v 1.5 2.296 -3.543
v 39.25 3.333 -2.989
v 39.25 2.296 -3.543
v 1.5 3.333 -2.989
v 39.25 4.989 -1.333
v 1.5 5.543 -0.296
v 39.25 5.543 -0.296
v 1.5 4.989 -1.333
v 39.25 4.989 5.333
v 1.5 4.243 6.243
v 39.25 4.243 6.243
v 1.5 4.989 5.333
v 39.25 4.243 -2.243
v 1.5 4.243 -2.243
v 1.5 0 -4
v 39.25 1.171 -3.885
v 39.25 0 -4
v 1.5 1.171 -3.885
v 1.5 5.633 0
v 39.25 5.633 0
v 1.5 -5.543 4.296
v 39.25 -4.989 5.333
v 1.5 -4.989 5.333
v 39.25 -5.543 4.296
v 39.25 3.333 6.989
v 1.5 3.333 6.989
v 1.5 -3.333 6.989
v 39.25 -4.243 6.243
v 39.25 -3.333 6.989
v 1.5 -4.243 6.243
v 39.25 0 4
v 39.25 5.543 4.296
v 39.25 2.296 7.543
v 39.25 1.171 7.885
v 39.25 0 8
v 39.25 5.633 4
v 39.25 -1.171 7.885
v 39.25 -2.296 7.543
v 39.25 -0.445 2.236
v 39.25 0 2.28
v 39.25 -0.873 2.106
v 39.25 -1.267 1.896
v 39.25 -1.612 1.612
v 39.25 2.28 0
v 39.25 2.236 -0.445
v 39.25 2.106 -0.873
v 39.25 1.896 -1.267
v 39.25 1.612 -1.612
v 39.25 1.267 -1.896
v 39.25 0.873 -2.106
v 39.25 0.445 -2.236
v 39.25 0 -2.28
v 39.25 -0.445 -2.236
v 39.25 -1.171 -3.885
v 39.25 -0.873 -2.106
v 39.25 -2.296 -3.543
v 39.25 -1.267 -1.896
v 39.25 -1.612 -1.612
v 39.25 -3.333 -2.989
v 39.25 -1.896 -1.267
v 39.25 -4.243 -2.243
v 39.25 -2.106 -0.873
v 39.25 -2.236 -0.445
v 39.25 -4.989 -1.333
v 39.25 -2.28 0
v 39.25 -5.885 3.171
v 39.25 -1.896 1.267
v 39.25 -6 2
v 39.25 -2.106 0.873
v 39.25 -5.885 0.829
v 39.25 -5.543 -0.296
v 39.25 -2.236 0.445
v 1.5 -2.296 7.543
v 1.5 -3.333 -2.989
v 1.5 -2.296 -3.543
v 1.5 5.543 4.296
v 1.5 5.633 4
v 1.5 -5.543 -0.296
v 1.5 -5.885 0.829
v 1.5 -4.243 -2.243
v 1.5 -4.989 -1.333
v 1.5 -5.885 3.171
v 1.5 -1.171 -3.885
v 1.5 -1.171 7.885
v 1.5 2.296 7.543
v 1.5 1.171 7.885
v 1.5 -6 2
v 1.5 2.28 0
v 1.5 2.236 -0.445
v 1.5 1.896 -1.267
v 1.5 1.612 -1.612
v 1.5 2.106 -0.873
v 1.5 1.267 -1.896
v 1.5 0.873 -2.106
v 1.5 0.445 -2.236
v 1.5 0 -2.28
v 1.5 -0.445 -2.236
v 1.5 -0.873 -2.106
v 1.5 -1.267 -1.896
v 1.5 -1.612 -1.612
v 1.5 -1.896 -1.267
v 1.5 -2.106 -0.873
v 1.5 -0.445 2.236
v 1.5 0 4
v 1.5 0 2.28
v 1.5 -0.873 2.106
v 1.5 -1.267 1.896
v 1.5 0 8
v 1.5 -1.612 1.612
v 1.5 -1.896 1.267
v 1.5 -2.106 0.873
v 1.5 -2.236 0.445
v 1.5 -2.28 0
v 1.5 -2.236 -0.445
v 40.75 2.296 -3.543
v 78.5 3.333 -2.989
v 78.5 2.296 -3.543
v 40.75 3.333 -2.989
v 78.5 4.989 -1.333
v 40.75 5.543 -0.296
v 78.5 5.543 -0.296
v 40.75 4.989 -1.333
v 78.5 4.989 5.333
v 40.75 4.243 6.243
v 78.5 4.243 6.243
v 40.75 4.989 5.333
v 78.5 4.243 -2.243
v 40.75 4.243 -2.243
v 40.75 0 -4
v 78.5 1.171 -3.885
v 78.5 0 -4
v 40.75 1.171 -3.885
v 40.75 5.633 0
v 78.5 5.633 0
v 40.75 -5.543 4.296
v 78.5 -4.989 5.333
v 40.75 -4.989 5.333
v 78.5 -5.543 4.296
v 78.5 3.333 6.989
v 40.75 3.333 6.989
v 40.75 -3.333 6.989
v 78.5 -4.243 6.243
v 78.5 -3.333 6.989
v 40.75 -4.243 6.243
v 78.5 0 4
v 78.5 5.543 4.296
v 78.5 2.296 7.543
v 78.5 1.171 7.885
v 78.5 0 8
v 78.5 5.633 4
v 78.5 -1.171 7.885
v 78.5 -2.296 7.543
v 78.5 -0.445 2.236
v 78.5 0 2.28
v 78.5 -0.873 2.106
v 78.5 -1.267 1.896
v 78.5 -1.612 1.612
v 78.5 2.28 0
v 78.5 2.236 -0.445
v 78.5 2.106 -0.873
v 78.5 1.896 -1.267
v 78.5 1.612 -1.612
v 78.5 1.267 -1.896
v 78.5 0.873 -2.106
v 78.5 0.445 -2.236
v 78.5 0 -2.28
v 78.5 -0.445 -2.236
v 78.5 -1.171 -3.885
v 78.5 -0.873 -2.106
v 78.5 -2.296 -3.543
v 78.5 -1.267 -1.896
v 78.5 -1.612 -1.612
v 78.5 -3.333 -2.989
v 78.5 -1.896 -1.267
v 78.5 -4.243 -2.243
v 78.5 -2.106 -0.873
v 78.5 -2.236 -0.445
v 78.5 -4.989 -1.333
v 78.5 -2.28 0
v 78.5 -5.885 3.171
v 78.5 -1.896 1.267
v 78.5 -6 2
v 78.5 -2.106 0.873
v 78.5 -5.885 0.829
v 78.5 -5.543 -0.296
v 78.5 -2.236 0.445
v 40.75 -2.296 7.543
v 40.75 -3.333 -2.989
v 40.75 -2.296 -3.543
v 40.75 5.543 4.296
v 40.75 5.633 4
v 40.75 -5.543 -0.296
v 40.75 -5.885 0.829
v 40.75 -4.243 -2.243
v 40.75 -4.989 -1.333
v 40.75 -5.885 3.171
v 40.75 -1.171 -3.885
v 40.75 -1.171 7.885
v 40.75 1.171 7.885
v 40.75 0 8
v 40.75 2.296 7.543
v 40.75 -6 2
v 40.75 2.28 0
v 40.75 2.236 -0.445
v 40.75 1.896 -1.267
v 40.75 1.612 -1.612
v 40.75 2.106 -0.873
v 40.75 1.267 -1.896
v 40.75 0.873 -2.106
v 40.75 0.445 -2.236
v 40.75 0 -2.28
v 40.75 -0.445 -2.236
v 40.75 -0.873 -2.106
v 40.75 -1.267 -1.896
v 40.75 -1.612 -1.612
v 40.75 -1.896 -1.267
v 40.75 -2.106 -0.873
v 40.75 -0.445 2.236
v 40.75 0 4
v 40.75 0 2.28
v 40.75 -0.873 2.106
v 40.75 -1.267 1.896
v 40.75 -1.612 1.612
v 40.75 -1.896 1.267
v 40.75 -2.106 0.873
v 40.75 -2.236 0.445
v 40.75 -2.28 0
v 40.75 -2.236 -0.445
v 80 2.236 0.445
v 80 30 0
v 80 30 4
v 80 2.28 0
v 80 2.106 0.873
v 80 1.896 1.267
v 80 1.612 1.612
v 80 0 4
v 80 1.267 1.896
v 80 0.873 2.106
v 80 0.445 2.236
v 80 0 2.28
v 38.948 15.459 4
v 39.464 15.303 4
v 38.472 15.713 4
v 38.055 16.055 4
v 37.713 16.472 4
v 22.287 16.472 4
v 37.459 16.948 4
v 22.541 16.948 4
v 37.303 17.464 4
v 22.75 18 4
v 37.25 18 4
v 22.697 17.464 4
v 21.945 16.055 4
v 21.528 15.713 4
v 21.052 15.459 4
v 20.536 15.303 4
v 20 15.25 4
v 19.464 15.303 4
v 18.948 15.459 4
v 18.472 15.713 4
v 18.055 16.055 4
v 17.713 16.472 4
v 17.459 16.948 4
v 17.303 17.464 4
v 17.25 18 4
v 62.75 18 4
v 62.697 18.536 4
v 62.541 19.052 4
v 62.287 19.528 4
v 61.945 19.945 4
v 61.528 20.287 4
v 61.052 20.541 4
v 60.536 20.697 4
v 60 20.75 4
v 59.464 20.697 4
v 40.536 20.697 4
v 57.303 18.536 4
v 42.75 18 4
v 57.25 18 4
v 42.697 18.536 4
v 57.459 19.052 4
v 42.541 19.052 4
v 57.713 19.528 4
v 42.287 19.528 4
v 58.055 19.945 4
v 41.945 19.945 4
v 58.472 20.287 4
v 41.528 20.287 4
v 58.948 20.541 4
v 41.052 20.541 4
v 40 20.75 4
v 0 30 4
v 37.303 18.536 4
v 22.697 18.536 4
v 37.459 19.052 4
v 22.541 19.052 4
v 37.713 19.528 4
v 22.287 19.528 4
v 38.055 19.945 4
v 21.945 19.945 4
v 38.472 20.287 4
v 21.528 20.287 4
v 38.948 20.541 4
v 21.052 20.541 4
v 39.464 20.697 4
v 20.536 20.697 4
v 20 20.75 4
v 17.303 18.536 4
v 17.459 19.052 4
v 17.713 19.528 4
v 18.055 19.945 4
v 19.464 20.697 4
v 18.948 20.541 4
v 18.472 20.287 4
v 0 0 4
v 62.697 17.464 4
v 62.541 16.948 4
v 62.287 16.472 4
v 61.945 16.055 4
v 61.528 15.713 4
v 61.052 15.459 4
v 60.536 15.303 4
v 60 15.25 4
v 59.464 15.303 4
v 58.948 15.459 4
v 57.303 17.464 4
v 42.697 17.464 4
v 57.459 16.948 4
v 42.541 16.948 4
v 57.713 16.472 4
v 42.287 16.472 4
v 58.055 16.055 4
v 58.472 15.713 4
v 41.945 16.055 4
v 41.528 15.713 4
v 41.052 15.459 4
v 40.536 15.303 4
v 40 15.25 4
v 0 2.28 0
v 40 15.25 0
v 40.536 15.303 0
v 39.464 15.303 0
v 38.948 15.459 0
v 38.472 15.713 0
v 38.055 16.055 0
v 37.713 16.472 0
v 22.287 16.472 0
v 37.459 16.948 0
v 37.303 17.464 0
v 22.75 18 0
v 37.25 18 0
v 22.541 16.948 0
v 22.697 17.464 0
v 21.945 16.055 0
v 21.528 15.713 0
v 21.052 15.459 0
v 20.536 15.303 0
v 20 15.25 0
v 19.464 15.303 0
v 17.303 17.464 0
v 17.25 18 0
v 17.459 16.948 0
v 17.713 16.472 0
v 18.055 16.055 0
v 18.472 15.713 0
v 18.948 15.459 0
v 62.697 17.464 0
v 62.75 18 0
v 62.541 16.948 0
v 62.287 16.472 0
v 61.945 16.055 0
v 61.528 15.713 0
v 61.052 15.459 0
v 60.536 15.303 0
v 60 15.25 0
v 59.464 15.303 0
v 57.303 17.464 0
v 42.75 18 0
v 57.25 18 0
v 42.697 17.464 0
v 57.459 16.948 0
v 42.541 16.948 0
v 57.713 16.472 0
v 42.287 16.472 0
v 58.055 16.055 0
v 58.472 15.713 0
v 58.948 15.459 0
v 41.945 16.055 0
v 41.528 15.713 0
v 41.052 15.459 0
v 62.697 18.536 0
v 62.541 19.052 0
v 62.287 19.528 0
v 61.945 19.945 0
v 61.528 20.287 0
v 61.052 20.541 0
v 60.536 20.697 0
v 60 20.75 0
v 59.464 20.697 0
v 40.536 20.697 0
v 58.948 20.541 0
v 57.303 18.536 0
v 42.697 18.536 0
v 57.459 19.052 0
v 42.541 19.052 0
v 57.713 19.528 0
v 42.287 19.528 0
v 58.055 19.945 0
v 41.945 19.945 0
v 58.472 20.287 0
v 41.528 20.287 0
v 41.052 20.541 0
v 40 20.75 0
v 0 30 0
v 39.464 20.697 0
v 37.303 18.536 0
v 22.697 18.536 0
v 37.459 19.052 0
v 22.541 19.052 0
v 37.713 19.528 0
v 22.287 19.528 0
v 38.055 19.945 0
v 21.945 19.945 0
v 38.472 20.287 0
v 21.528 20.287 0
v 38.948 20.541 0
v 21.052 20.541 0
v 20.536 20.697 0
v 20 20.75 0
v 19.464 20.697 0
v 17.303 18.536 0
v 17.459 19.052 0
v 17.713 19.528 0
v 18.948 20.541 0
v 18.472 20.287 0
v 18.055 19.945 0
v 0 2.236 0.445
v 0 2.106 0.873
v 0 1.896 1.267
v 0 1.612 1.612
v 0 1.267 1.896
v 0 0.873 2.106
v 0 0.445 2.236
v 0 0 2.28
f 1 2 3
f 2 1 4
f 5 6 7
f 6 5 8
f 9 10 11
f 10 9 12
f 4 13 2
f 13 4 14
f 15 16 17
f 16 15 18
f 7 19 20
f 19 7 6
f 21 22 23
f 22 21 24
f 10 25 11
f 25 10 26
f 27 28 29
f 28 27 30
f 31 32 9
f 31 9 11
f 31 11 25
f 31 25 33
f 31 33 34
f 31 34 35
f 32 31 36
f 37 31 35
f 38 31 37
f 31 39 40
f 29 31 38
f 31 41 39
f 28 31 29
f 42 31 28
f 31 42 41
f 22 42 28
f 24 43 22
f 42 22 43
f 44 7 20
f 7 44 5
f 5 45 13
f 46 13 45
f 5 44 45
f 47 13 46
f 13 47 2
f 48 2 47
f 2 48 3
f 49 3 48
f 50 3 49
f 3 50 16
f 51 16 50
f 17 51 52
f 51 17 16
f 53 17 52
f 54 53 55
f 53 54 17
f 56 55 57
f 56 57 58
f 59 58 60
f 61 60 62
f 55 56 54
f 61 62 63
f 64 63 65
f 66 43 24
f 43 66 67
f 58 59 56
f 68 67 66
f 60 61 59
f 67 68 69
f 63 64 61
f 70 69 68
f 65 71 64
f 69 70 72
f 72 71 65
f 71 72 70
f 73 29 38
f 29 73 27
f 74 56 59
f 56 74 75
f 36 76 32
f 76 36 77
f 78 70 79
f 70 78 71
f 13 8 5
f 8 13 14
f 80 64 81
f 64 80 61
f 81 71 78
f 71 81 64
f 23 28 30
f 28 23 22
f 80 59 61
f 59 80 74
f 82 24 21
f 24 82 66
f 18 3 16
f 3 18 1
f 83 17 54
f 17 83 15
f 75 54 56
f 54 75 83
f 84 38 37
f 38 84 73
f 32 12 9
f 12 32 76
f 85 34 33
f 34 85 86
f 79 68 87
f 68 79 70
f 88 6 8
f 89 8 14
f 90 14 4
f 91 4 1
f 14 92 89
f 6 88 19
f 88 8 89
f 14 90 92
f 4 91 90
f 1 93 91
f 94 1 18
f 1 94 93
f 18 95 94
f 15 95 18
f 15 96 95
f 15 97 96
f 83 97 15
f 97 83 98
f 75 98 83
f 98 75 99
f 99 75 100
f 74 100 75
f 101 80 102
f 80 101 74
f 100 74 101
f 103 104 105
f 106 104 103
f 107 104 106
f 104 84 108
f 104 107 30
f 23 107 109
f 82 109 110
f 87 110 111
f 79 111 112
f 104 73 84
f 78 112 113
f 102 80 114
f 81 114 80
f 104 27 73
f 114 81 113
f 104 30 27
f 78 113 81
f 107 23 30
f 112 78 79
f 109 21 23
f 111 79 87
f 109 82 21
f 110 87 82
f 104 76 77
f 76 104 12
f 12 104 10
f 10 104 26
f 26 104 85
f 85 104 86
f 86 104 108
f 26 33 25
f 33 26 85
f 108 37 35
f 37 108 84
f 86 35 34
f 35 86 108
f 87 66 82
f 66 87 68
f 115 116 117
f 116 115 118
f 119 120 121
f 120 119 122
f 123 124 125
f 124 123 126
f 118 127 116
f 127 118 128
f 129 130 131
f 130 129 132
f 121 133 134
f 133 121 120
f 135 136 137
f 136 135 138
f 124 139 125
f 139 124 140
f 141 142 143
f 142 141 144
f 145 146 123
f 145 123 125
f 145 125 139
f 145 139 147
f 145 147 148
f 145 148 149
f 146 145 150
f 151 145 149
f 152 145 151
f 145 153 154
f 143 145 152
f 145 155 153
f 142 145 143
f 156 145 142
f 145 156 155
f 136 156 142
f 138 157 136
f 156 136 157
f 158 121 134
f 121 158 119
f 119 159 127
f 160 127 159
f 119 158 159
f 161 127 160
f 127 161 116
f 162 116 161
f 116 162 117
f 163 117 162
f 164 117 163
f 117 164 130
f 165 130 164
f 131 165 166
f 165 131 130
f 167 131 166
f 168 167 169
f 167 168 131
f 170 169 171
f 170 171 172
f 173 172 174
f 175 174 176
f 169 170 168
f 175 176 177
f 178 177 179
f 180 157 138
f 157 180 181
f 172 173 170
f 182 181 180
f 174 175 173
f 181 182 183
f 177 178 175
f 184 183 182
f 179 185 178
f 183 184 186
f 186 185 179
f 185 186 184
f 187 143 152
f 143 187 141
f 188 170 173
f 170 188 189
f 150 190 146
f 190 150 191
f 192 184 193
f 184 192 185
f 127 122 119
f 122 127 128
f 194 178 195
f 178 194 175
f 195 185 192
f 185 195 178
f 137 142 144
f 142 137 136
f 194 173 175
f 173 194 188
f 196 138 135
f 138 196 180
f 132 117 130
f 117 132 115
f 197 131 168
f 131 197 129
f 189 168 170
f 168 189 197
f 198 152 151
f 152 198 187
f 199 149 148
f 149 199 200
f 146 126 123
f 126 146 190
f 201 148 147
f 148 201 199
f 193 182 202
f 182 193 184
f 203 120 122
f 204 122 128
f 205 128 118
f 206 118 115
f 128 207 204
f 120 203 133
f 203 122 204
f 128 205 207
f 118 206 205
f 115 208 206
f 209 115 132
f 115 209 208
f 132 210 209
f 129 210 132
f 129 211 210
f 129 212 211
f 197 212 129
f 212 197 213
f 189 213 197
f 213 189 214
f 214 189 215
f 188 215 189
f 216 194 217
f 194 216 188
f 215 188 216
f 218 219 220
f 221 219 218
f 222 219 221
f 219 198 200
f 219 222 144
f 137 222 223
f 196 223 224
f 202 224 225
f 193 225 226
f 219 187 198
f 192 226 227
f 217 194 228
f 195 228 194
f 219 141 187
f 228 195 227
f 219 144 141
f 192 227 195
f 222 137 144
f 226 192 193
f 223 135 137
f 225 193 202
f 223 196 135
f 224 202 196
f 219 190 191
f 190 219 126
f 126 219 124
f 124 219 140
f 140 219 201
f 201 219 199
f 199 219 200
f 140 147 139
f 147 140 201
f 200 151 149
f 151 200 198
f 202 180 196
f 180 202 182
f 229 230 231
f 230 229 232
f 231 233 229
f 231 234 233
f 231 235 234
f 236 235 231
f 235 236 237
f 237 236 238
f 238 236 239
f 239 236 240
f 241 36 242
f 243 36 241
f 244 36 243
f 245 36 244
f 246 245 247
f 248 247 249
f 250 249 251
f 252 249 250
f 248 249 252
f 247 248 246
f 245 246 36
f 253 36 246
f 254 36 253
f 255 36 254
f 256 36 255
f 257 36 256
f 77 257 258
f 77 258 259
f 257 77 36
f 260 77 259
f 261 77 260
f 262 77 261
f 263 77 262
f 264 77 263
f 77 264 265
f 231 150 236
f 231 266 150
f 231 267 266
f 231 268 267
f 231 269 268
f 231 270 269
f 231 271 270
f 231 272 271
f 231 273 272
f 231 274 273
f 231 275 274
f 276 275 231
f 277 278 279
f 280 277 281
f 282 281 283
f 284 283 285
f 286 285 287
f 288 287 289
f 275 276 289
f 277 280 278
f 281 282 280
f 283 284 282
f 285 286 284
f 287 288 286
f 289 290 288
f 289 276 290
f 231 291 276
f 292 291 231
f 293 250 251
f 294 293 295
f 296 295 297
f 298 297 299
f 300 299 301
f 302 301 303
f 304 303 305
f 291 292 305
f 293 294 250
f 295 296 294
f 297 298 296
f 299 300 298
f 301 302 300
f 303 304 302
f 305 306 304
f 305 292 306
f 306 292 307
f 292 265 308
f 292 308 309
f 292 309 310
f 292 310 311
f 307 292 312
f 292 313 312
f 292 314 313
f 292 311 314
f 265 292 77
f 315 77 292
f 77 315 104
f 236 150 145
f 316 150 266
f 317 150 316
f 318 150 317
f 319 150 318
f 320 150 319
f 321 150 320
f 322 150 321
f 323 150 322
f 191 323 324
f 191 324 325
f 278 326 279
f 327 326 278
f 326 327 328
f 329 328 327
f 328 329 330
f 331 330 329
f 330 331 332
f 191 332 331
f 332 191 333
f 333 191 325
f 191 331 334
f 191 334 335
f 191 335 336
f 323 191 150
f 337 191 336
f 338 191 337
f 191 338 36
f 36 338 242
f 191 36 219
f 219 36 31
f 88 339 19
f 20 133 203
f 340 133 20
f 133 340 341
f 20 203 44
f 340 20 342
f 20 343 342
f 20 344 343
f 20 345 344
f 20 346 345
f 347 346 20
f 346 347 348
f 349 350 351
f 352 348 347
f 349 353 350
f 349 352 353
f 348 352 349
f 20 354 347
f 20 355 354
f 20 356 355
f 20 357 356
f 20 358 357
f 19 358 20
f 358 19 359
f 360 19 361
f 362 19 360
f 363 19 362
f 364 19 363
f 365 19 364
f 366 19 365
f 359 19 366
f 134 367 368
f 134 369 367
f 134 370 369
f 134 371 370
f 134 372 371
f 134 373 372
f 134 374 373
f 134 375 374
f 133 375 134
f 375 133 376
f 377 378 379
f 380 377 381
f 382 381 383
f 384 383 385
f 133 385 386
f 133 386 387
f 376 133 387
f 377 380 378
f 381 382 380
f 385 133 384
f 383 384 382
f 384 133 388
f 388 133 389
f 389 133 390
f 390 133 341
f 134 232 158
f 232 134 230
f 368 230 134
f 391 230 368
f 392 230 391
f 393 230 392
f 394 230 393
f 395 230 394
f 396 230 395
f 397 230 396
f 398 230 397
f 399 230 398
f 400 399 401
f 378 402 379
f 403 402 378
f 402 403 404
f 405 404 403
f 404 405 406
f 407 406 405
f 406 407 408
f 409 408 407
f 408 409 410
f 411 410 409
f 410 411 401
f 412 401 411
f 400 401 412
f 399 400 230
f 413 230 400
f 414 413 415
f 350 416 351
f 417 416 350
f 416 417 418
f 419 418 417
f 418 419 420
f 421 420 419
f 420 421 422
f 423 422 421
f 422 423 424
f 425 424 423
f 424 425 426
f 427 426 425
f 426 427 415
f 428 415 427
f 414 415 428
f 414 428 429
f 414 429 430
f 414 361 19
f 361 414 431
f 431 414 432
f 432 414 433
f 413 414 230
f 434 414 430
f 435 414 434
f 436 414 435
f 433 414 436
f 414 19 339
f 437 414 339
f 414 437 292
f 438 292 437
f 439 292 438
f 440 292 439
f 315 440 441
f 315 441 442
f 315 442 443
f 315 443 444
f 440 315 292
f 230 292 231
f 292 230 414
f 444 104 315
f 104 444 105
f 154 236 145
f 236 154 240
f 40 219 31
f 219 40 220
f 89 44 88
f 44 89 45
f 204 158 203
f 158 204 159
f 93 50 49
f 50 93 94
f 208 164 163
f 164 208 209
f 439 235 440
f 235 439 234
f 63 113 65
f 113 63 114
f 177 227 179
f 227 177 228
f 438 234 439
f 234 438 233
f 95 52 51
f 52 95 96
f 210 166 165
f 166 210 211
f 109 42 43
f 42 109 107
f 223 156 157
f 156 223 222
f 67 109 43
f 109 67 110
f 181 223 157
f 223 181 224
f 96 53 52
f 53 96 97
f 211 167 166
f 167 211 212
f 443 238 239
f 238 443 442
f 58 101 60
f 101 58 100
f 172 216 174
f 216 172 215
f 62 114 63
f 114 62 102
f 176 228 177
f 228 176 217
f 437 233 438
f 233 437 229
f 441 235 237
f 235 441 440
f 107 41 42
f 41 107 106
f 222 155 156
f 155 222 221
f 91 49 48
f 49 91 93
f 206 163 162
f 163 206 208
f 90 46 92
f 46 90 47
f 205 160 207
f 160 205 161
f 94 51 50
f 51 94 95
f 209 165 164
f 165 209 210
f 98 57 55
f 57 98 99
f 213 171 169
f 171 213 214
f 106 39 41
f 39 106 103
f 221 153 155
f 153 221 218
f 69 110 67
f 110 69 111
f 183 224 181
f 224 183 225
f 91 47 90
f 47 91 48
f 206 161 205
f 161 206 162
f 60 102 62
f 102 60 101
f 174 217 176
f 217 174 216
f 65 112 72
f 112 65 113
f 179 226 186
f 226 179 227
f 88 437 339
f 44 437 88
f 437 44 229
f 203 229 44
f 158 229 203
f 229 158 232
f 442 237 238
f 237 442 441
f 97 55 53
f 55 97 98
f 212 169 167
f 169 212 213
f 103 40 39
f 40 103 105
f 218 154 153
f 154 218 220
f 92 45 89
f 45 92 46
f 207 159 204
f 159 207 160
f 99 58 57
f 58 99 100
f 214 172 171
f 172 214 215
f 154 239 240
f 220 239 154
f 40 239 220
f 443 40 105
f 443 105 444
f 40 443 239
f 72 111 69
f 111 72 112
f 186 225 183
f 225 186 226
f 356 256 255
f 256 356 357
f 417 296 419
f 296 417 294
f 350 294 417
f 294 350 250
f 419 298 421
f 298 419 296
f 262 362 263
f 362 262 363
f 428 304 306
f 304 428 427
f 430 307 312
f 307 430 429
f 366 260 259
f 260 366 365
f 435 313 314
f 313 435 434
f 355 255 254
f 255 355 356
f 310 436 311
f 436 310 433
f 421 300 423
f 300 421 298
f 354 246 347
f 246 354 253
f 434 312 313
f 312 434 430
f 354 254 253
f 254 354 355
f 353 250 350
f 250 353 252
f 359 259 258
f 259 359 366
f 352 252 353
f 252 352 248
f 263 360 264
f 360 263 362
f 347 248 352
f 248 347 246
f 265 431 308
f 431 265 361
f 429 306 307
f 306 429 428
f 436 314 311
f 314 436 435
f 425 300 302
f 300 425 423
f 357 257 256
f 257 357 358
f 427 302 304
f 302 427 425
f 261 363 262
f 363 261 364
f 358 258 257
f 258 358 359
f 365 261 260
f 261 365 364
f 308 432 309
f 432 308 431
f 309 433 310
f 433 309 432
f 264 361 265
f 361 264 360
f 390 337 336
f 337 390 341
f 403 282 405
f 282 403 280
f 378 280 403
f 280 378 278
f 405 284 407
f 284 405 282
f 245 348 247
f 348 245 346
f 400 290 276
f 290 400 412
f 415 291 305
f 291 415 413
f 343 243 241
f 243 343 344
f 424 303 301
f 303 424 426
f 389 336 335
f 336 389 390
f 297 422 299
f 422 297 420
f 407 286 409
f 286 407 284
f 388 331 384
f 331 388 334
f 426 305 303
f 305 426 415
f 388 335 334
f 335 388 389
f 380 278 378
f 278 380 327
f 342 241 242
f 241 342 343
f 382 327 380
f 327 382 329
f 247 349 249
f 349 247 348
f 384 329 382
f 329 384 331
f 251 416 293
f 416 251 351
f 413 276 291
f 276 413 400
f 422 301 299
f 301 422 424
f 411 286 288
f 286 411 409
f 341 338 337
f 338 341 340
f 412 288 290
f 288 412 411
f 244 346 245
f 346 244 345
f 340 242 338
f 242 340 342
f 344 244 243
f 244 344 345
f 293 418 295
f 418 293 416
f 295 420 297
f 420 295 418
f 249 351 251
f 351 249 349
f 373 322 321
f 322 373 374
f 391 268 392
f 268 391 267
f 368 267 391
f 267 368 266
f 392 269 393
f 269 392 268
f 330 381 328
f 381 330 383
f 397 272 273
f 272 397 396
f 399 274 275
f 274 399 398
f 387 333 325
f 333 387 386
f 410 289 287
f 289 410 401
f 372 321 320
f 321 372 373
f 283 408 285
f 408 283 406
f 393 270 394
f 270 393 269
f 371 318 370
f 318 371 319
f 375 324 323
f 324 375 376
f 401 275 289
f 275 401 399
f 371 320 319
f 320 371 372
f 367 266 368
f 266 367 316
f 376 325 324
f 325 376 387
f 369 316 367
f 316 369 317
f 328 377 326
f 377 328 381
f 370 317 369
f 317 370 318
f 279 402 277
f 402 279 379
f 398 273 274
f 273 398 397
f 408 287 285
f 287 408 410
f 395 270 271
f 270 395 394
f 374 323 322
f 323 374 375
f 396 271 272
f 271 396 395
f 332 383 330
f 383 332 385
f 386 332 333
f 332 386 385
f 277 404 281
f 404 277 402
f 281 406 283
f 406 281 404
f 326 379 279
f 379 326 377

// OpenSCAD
$fn = 32;

// ----------------------------------------------------------------------
// Hinge leaf: 80 x 36 x 12 mm
// ----------------------------------------------------------------------

// --- parameters (mm) ---
tab_len = 80;             // leaf length, X
tab_w = 30;               // leaf width, Y
tab_t = 4;                // leaf thickness
ring_d = 12;              // knuckle diameter
ring_w = 37.75;           // knuckle width
knuckle_n = 2;            // number of knuckles
pin_d = 4.56;             // pin bore
gap = 1.5;                // gap between the knuckles
screw_d = 5.5;            // screw clearance

module leaf() {
  cube([tab_len, tab_w, tab_t]);
}

module knuckles() {
  /* barrels sit on the leaf edge, the pin axis at half the leaf thickness */
  for (i = [0 : knuckle_n - 1])
    translate([gap + i * (ring_w + gap), 0, tab_t * 0.5])
      rotate([0, 90, 0]) cylinder(h = ring_w, d = ring_d);
}

difference() {
  union() {
    leaf();
    knuckles();
  }
  rotate([0, 90, 0]) translate([0, 0, -1])
    cylinder(h = tab_len + 2, d = pin_d);
  translate([20, tab_w * 0.6, -1]) cylinder(h = tab_t + 2, d = screw_d);
  translate([40, tab_w * 0.6, -1]) cylinder(h = tab_t + 2, d = screw_d);
  translate([60, tab_w * 0.6, -1]) cylinder(h = tab_t + 2, d = screw_d);
}
